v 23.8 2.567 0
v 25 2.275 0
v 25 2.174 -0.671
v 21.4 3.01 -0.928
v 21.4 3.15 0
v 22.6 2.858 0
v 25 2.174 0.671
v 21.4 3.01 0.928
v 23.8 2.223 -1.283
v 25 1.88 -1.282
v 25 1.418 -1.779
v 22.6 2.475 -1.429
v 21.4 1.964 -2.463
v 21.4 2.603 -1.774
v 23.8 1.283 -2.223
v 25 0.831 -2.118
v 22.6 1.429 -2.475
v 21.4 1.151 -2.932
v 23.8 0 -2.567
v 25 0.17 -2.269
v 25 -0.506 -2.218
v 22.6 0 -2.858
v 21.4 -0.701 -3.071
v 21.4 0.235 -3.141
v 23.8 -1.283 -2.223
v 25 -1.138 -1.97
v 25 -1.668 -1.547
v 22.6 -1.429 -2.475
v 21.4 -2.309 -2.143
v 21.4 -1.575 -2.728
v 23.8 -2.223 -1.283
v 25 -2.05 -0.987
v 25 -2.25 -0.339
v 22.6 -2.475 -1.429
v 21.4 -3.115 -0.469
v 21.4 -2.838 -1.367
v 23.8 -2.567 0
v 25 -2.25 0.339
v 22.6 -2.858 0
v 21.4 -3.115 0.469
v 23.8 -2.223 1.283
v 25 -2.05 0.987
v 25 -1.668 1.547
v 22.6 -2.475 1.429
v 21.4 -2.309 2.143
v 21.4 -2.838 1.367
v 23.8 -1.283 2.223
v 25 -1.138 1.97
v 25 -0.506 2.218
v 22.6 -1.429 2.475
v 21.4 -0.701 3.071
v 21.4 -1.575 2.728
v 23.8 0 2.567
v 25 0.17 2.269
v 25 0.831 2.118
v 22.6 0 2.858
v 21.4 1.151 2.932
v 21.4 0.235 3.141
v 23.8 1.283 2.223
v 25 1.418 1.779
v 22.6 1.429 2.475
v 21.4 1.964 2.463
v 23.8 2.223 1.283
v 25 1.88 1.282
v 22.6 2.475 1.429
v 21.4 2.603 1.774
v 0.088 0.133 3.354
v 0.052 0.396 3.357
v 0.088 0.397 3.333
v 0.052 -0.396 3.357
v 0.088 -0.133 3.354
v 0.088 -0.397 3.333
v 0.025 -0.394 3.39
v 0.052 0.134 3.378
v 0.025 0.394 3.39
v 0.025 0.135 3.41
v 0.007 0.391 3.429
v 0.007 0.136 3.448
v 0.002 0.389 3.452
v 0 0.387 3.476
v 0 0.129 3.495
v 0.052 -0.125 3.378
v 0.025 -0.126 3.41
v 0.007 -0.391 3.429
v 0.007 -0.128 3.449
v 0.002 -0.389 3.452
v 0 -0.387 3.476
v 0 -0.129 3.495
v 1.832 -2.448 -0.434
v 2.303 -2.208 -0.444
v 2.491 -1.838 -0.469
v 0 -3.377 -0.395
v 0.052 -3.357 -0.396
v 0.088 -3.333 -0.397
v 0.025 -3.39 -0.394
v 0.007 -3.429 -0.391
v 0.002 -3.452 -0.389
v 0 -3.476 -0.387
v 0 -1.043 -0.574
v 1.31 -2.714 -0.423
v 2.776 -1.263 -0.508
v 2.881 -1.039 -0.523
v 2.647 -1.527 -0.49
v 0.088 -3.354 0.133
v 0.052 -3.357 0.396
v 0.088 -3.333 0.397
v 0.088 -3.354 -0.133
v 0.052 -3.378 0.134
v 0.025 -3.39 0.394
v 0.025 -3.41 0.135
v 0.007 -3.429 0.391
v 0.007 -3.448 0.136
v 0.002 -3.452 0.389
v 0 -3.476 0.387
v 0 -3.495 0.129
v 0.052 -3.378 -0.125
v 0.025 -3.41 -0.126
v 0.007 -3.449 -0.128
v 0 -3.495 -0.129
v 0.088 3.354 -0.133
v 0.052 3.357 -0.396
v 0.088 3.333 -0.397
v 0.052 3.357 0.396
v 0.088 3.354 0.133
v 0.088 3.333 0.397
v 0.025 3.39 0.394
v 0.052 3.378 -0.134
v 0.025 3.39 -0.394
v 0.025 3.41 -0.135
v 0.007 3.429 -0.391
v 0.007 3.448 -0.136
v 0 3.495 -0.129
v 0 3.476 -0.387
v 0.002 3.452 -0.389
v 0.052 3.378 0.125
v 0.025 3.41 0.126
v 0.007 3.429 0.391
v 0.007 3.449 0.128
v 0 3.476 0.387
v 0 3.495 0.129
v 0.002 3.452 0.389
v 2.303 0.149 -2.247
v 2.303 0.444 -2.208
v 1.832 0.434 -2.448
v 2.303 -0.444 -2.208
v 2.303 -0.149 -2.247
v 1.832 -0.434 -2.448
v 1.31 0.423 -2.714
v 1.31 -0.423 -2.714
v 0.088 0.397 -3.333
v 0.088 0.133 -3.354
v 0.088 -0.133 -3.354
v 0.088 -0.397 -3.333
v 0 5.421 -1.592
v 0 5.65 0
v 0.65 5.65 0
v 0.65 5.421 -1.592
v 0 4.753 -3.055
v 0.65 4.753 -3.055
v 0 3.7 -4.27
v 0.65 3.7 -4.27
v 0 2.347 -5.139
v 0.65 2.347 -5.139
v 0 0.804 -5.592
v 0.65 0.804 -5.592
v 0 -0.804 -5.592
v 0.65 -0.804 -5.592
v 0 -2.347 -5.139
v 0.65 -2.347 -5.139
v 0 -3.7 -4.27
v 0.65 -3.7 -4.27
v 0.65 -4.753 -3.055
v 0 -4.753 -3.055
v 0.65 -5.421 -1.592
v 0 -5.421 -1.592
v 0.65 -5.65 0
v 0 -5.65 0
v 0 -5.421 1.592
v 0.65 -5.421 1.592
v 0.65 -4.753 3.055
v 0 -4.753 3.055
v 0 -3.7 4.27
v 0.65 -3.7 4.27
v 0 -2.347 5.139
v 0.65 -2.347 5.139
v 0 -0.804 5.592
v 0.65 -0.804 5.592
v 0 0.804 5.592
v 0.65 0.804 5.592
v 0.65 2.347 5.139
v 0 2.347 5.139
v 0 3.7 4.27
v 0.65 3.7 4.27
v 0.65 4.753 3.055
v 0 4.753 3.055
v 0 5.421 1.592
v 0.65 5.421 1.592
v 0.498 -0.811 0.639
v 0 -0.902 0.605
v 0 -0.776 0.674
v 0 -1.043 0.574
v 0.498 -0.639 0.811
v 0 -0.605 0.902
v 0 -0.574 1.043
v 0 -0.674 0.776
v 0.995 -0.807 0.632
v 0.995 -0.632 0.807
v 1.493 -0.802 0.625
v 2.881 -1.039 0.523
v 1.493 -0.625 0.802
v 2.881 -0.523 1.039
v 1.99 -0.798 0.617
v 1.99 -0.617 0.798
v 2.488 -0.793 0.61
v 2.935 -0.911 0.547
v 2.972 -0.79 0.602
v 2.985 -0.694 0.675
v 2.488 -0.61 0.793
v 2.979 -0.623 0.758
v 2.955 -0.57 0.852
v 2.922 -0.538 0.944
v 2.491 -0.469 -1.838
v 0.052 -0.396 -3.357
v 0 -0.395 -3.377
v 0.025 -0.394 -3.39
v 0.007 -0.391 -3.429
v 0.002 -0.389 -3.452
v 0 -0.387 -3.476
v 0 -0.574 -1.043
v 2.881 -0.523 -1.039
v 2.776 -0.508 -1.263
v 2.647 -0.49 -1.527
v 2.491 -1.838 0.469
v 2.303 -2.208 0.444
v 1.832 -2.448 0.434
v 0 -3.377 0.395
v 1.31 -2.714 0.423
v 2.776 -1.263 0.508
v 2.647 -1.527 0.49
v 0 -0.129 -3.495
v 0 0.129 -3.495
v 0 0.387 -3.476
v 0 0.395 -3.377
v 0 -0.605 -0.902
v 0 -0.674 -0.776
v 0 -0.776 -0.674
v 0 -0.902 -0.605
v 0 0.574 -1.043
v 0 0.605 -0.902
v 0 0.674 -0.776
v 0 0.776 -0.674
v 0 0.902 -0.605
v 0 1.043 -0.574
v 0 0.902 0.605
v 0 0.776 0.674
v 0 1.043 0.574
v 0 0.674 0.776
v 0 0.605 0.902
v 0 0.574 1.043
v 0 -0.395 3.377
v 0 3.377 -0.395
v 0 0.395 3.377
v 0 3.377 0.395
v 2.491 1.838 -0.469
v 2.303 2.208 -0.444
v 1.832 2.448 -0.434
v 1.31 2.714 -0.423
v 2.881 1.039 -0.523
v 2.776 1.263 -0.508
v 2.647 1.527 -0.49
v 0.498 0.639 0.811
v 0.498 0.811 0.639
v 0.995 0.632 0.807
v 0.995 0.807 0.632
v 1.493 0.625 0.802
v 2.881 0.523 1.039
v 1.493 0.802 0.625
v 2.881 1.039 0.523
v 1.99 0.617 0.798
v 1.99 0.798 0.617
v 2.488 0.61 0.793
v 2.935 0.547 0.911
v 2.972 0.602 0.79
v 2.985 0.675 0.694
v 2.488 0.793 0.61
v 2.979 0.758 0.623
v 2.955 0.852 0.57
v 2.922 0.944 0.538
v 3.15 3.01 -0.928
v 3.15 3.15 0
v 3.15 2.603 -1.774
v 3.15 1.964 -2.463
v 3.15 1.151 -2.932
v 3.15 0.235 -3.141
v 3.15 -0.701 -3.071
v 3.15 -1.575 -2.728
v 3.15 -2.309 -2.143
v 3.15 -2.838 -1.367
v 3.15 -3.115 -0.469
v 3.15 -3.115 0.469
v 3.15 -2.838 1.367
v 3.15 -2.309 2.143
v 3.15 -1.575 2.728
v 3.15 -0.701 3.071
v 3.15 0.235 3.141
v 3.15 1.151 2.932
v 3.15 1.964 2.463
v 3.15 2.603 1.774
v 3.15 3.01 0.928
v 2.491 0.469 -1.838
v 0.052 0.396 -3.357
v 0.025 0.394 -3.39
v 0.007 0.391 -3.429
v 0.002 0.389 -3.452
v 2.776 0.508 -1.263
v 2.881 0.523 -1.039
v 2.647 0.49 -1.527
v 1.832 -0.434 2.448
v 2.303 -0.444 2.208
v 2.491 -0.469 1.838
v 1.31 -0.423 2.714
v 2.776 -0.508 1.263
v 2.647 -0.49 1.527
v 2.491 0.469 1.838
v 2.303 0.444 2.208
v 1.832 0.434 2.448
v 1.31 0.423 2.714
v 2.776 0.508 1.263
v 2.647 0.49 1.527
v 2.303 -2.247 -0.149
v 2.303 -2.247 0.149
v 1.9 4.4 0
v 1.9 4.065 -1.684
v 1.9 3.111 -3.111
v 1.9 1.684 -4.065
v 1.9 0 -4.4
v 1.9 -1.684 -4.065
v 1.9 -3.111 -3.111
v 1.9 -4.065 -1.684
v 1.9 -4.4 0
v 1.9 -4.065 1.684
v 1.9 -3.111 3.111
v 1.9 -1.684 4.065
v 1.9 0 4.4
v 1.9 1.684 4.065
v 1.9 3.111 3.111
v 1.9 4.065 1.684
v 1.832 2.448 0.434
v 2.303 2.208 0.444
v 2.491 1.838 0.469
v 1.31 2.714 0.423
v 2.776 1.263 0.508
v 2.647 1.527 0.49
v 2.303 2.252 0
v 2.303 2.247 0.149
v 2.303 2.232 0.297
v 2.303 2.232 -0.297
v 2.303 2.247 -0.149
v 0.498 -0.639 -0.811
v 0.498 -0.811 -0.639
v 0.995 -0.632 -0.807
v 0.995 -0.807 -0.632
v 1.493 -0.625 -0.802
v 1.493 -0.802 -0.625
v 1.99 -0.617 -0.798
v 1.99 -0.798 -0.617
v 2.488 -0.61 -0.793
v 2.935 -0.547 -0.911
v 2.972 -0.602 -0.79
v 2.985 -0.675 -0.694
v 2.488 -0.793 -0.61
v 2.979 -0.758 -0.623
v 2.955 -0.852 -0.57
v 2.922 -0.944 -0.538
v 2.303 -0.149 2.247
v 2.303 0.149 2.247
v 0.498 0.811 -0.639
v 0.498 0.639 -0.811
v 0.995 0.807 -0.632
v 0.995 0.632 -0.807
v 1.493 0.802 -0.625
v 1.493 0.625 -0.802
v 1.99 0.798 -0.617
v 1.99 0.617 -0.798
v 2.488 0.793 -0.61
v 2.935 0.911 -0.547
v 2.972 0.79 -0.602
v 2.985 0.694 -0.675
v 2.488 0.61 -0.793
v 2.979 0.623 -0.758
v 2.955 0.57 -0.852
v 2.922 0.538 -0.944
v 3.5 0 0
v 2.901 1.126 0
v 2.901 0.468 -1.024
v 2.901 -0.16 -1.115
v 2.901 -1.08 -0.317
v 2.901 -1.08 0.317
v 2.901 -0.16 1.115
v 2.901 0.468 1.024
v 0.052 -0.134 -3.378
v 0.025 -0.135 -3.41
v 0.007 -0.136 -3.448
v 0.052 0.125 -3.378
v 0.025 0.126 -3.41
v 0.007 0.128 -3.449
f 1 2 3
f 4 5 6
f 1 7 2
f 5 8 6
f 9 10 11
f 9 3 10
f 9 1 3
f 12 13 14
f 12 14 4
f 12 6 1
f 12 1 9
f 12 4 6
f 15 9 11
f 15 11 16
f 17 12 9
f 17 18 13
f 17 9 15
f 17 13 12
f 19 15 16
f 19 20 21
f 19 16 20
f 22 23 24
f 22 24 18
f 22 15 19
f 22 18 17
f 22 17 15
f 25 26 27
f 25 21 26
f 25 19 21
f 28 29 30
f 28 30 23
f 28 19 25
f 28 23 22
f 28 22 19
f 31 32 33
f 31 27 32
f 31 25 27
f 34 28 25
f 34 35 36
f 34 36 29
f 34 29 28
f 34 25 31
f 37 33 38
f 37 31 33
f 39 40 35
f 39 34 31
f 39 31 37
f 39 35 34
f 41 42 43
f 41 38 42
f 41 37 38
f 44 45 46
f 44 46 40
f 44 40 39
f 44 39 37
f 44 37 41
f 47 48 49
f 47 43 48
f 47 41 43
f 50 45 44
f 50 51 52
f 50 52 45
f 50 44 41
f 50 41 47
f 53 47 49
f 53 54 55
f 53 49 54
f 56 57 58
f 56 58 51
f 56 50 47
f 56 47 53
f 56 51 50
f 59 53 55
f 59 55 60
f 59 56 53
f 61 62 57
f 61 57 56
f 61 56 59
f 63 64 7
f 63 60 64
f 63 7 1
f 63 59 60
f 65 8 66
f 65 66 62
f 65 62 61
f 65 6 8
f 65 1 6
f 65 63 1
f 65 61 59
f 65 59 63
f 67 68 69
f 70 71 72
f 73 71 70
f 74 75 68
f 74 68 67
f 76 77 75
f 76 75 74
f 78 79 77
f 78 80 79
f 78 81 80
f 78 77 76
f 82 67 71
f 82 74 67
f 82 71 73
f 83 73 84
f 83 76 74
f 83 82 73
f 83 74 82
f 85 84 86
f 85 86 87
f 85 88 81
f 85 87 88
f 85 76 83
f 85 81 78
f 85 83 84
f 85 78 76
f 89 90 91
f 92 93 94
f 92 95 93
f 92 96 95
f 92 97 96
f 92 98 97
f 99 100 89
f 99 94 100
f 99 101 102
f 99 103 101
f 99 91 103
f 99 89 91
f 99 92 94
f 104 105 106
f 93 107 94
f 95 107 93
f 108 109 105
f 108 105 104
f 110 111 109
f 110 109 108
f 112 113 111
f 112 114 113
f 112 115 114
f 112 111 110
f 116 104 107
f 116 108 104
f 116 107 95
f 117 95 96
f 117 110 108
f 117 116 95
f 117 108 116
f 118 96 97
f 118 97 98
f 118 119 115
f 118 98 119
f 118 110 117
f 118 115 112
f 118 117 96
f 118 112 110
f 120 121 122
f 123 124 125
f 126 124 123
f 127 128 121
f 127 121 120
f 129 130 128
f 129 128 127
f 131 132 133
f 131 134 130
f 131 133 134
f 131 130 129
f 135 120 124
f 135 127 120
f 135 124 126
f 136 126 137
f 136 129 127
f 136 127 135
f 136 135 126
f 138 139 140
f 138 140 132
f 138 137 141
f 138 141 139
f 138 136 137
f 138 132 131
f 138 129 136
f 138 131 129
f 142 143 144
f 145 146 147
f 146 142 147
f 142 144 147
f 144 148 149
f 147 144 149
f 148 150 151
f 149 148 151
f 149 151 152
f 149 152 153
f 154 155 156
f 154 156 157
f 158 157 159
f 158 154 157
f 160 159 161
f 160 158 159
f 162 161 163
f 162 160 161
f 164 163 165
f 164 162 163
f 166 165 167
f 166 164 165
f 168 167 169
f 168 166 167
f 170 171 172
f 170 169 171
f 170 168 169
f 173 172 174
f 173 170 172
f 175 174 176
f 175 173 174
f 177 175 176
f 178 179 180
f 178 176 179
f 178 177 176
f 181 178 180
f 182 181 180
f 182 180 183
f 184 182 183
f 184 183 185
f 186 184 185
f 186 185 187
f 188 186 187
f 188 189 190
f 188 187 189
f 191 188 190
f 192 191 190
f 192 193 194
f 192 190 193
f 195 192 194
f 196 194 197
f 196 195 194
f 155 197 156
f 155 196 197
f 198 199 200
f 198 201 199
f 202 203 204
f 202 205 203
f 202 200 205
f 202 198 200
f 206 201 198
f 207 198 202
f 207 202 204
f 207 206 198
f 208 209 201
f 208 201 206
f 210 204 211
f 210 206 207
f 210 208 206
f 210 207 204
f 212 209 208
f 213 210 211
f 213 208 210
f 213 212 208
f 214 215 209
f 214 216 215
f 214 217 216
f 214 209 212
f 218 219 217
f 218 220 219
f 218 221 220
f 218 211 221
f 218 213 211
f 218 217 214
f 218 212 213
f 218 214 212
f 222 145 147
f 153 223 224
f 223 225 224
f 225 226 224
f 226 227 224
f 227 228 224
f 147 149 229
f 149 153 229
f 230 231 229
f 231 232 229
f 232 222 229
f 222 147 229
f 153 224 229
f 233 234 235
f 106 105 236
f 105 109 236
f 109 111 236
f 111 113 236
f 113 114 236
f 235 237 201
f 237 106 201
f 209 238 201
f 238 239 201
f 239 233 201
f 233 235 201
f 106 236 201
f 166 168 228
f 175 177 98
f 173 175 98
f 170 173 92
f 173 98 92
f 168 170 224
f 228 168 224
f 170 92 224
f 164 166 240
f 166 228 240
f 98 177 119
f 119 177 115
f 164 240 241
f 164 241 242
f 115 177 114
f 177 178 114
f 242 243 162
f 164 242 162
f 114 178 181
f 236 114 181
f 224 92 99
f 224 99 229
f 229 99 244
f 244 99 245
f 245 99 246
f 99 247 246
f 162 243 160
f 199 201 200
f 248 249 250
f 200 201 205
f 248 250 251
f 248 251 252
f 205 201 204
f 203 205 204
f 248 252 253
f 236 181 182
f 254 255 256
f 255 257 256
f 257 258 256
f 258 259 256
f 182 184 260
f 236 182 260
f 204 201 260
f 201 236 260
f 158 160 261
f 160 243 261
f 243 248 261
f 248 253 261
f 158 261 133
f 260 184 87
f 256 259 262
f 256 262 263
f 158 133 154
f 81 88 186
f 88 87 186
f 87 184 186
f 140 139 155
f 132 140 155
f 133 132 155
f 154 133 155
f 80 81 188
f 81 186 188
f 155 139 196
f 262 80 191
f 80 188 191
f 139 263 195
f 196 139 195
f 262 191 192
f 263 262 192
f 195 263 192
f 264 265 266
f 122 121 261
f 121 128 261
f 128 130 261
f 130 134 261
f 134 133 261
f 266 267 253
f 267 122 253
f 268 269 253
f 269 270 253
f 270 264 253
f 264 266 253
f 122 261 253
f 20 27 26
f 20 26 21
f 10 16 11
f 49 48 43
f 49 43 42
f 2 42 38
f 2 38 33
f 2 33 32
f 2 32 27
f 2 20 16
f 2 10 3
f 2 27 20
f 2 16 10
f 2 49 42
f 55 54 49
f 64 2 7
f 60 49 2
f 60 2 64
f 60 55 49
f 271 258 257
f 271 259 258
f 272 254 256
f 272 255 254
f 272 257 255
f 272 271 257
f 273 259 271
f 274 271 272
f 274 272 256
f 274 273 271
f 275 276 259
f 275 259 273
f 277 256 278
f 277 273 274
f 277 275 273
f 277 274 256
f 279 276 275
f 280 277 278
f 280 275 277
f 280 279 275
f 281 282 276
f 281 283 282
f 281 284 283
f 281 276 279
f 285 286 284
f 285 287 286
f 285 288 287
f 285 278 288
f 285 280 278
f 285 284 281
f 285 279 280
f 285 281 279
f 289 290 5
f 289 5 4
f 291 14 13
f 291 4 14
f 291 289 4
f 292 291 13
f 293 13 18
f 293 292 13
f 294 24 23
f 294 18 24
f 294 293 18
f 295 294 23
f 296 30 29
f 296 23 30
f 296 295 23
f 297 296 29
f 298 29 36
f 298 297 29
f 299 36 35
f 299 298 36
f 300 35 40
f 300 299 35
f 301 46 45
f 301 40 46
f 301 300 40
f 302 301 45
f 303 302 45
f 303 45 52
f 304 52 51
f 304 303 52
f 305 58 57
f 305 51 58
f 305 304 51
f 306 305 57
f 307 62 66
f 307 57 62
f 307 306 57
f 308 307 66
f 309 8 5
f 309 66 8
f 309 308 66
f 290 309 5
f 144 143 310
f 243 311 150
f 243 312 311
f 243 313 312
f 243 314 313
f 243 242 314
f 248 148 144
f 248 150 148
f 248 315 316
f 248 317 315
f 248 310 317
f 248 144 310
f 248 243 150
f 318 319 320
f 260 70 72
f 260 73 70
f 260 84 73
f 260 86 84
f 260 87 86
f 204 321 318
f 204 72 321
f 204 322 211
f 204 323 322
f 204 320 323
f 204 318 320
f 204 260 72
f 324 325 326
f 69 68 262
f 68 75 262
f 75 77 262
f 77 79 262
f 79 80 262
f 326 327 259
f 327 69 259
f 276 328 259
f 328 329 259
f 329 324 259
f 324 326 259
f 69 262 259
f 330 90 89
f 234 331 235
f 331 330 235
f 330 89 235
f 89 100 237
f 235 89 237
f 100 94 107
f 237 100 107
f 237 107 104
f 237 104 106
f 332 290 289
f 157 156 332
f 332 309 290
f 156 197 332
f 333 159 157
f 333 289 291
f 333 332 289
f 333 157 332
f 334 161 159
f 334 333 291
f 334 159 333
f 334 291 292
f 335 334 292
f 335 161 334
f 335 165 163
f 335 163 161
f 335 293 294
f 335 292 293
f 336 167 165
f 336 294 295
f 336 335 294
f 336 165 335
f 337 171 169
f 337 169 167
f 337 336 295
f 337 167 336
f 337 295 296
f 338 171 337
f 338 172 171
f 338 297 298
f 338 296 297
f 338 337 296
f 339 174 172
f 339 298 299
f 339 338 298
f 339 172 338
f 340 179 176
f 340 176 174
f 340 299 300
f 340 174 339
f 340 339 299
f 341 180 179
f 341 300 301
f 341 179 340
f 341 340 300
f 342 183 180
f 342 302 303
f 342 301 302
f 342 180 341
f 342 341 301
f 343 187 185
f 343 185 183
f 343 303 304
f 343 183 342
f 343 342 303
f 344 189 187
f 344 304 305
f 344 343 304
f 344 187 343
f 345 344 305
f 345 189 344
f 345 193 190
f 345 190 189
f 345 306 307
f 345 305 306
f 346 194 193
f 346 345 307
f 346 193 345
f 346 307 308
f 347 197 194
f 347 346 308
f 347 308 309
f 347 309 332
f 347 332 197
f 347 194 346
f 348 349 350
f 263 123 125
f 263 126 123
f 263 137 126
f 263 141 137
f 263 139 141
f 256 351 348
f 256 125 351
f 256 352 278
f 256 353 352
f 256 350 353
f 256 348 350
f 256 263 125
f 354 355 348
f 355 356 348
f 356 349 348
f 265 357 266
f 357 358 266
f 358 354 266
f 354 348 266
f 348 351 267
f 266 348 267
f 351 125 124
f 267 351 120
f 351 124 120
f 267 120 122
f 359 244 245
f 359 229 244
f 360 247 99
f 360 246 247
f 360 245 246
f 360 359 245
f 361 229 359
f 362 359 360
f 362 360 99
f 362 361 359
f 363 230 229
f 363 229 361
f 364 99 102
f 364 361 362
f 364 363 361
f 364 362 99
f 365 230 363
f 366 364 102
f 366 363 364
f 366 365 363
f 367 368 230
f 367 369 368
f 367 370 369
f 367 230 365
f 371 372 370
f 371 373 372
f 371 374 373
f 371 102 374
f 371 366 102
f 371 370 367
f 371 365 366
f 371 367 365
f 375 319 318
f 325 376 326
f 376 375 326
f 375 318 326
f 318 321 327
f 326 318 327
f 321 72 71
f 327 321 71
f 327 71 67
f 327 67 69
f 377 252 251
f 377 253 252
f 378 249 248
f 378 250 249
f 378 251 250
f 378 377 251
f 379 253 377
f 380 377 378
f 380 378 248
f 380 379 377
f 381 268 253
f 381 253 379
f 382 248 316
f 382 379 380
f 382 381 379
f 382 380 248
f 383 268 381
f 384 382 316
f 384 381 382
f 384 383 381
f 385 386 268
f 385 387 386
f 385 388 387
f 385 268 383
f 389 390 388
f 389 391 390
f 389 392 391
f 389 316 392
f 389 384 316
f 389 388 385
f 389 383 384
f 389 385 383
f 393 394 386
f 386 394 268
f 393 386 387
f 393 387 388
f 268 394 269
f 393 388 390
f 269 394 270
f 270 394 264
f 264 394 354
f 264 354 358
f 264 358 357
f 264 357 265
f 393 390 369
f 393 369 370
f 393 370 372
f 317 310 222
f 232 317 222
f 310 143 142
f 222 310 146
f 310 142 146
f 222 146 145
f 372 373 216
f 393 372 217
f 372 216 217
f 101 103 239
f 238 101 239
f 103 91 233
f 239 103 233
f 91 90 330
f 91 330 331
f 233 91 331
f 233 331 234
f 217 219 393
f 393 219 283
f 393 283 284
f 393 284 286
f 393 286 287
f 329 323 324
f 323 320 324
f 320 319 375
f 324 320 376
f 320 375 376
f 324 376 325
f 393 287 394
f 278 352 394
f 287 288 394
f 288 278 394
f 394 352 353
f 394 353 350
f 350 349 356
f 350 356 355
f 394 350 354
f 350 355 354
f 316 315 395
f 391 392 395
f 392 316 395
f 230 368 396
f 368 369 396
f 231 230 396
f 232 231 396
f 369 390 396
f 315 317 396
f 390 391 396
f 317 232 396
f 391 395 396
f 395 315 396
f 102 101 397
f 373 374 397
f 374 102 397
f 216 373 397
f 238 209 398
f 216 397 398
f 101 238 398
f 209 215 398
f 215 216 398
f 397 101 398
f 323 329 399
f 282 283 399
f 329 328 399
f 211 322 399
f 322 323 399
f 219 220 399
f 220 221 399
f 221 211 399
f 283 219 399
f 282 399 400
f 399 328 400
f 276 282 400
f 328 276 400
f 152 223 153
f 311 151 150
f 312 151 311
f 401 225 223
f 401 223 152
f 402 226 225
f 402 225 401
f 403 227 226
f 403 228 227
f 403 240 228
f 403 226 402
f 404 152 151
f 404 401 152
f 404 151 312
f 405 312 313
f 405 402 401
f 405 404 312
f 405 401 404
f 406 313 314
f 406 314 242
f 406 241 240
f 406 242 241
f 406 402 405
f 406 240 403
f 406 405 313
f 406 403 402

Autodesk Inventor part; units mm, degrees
ref_plane "YZ Plane" through (0, 0, 0) normal (1, 0, 0) x (0, 1, 0)
ref_plane "XZ Plane" through (0, 0, 0) normal (0, 1, 0) x (-1, 0, 0)
sketch "Sketch1" plane through (0, 0, 0) normal (0, 0, 1) x (1, 0, 0)
  line L0 (3.5, 0) -> (25, 0)
  line L1 (25, 0) -> (25, 3.15)
  line L2 (25, 3.15) -> (3.15, 3.15)
  line L3 (0.65, 5.65) -> (0, 5.65)
  line L4 (-5, 0) -> (30, 0) projected
  line L5 (0, -1.13) -> (0, 6.78) projected
  line L6 (0, 3.4) -> (2.3026, 2.252)
  line L7 (2.3026, 2.252) -> (3.5, 0)
  line L8 (3.15, 3.15) -> (0.65, 5.65)
  line L9 (0, 5.65) -> (0, 3.4)
  dimension "d2" = 6.3
  dimension "d3" = 11.3
  dimension "d4" = 3.5
  dimension "d5" = 6.8
  dimension "d6" = 26.5
  dimension "d7" = 62
  dimension "d13" = 45
  dimension "d14" = 3.15
  dimension "d15" = 25
revolve "Body" add sketch "Sketch1" angle 360 about axis through (3.5, 0, 0) along (1, 0, 0) contours L7 L6 L5 L3 L8 L2 L1 L0
sketch "Sketch2" plane through (0, 0, 0) normal (-1, 0, 0) x (0, 0, 1)
  line L0 (0, -7.91) -> (0, 7.91) projected
  line L1 (-7.91, 0) -> (7.91, 0) projected
  line L2 (0, 3.4) -> (0, 0) construction
  line L3 (0, 0) -> (3.4, 0) construction
  arc A0 (1.02, 0) -> (0, 1.02) centre (0, 0) ccw construction
  line L4 (0, 0) -> (3.9952, 3.9952) construction
  arc A1 (1.19, 0) -> (0, 1.19) centre (0, 0) ccw construction
  line L5 (0.395, 3.377) -> (0.5735, 1.0427)
  line L6 (3.377, 0.395) -> (1.0427, 0.5735)
  arc A2 (0.5735, 1.0427) -> (1.0427, 0.5735) centre (1.0815, 1.0815) ccw
  arc A3 (3.4, 0) -> (3.377, 0.395) centre (0, 0) ccw
  arc A4 (0.395, 3.377) -> (0, 3.4) centre (0, 0) ccw
  arc A5 (3.377, 0.395) -> (0.395, 3.377) centre (0, 0) ccw
  line L7 (0.395, -3.377) -> (0.5735, -1.0427)
  line L8 (3.377, -0.395) -> (1.0427, -0.5735)
  arc A6 (1.0427, -0.5735) -> (0.5735, -1.0427) centre (1.0815, -1.0815) ccw
  arc A7 (3.377, -0.395) -> (3.4, 0) centre (0, 0) ccw
  arc A8 (0, -3.4) -> (0.395, -3.377) centre (0, 0) ccw
  arc A9 (0.395, -3.377) -> (3.377, -0.395) centre (0, 0) ccw
  line L9 (-0.395, 3.377) -> (-0.5735, 1.0427)
  line L10 (-3.377, 0.395) -> (-1.0427, 0.5735)
  arc A10 (-1.0427, 0.5735) -> (-0.5735, 1.0427) centre (-1.0815, 1.0815) ccw
  arc A11 (-3.377, 0.395) -> (-3.4, 0) centre (0, 0) ccw
  arc A12 (0, 3.4) -> (-0.395, 3.377) centre (0, 0) ccw
  arc A13 (-0.395, 3.377) -> (-3.377, 0.395) centre (0, 0) ccw
  arc A14 (-3.377, -0.395) -> (-0.395, -3.377) centre (0, 0) ccw
  arc A15 (-0.395, -3.377) -> (0, -3.4) centre (0, 0) ccw
  arc A16 (-3.4, 0) -> (-3.377, -0.395) centre (0, 0) ccw
  line L11 (-3.377, -0.395) -> (-1.0427, -0.5735)
  arc A17 (-0.5735, -1.0427) -> (-1.0427, -0.5735) centre (-1.0815, -1.0815) ccw
  line L12 (-0.395, -3.377) -> (-0.5735, -1.0427)
  circle A18 centre (0, 0) radius 5.65 projected
  circle A19 centre (0, 0) radius 3.4 projected
  dimension "d18" = 45
  dimension "d19" = 2.04
  dimension "d20" = 2.38
  dimension "d21" = 6.8
  dimension "d22" = 0.395
extrude "Slot" add sketch "Sketch2" against normal up to next draft 1 contours L7 A6 L8 A9 | A14 L11 A17 L12 | A13 L9 A10 L10 | L6 A2 L5 A5
fillet "Fillet1" radius 0.158 4 edges at (0, 3.4, 0) (0, 0, 3.4) (0, -3.4, 0) (0, 0, -3.4)
thread "Thread" size "ST6.3x1.8" class "6g" standard "Metric Forming Screw Threads" length 21.85
chamfer "Chamfer1" distance 0.875 distance2 3.6 1 edges at (25, -3.15, 0) measured on face at (25, 1.1633, 0.933)
ref_plane "Work Plane2" through (2.8, 0, 0) normal (0, 1, 0) x (1, 0, 0)
equation "\"d2\" = NND"
equation "\"d3\" = KOD"
equation "\"d4\" = STI"
equation "\"d5\" = SDM"
equation "\"d13\" = 0.5 * SEWI"
equation "\"d14\" = KOH"
equation "\"d15\" = NLG"
equation "\"d19\" = 0.3 * SDM"
equation "\"d20\" = 0.35 * SDM"
equation "\"d21\" = SDM"
equation "\"d22\" = 0.5 * SBR"
equation "\"d45\" = STI"
equation "\"d25\" = 0.2 * SBR"
equation "\"d9\" = GEL"
equation "\"d11\" = -0.5 * GD2 + 0.5 * NND"
equation "\"d12\" = SPTZ"
equation "\"NND\" = 6.3"
equation "\"NLG\" = 25"
equation "\"GEL\" = 21.85"
equation "\"KOD\" = 11.3"
equation "\"KOH\" = 3.15"
equation "\"SDM\" = 6.8"
equation "\"STI\" = 3.5"
equation "\"SBR\" = 0.79"
equation "\"SPTZ\" = 3.6"
equation "\"GD2\" = 4.55"
equation "\"SEWI\" = 90deg"
equation "\"d0\" = NLG"
equation "\"d1\" = KOH"
equation "\"d17\" = SDM"
equation "\"EPV\" = 6.3"
equation "\"THREADDIA\" = 6.3"
equation "\"TOA\" = 30deg"
equation "\"PTC\" = 1.8"
equation "\"GD1\" = 4.88"
properties part number "ISO 7050 - ST6,3 x 25 - F - H" material "Steel"
